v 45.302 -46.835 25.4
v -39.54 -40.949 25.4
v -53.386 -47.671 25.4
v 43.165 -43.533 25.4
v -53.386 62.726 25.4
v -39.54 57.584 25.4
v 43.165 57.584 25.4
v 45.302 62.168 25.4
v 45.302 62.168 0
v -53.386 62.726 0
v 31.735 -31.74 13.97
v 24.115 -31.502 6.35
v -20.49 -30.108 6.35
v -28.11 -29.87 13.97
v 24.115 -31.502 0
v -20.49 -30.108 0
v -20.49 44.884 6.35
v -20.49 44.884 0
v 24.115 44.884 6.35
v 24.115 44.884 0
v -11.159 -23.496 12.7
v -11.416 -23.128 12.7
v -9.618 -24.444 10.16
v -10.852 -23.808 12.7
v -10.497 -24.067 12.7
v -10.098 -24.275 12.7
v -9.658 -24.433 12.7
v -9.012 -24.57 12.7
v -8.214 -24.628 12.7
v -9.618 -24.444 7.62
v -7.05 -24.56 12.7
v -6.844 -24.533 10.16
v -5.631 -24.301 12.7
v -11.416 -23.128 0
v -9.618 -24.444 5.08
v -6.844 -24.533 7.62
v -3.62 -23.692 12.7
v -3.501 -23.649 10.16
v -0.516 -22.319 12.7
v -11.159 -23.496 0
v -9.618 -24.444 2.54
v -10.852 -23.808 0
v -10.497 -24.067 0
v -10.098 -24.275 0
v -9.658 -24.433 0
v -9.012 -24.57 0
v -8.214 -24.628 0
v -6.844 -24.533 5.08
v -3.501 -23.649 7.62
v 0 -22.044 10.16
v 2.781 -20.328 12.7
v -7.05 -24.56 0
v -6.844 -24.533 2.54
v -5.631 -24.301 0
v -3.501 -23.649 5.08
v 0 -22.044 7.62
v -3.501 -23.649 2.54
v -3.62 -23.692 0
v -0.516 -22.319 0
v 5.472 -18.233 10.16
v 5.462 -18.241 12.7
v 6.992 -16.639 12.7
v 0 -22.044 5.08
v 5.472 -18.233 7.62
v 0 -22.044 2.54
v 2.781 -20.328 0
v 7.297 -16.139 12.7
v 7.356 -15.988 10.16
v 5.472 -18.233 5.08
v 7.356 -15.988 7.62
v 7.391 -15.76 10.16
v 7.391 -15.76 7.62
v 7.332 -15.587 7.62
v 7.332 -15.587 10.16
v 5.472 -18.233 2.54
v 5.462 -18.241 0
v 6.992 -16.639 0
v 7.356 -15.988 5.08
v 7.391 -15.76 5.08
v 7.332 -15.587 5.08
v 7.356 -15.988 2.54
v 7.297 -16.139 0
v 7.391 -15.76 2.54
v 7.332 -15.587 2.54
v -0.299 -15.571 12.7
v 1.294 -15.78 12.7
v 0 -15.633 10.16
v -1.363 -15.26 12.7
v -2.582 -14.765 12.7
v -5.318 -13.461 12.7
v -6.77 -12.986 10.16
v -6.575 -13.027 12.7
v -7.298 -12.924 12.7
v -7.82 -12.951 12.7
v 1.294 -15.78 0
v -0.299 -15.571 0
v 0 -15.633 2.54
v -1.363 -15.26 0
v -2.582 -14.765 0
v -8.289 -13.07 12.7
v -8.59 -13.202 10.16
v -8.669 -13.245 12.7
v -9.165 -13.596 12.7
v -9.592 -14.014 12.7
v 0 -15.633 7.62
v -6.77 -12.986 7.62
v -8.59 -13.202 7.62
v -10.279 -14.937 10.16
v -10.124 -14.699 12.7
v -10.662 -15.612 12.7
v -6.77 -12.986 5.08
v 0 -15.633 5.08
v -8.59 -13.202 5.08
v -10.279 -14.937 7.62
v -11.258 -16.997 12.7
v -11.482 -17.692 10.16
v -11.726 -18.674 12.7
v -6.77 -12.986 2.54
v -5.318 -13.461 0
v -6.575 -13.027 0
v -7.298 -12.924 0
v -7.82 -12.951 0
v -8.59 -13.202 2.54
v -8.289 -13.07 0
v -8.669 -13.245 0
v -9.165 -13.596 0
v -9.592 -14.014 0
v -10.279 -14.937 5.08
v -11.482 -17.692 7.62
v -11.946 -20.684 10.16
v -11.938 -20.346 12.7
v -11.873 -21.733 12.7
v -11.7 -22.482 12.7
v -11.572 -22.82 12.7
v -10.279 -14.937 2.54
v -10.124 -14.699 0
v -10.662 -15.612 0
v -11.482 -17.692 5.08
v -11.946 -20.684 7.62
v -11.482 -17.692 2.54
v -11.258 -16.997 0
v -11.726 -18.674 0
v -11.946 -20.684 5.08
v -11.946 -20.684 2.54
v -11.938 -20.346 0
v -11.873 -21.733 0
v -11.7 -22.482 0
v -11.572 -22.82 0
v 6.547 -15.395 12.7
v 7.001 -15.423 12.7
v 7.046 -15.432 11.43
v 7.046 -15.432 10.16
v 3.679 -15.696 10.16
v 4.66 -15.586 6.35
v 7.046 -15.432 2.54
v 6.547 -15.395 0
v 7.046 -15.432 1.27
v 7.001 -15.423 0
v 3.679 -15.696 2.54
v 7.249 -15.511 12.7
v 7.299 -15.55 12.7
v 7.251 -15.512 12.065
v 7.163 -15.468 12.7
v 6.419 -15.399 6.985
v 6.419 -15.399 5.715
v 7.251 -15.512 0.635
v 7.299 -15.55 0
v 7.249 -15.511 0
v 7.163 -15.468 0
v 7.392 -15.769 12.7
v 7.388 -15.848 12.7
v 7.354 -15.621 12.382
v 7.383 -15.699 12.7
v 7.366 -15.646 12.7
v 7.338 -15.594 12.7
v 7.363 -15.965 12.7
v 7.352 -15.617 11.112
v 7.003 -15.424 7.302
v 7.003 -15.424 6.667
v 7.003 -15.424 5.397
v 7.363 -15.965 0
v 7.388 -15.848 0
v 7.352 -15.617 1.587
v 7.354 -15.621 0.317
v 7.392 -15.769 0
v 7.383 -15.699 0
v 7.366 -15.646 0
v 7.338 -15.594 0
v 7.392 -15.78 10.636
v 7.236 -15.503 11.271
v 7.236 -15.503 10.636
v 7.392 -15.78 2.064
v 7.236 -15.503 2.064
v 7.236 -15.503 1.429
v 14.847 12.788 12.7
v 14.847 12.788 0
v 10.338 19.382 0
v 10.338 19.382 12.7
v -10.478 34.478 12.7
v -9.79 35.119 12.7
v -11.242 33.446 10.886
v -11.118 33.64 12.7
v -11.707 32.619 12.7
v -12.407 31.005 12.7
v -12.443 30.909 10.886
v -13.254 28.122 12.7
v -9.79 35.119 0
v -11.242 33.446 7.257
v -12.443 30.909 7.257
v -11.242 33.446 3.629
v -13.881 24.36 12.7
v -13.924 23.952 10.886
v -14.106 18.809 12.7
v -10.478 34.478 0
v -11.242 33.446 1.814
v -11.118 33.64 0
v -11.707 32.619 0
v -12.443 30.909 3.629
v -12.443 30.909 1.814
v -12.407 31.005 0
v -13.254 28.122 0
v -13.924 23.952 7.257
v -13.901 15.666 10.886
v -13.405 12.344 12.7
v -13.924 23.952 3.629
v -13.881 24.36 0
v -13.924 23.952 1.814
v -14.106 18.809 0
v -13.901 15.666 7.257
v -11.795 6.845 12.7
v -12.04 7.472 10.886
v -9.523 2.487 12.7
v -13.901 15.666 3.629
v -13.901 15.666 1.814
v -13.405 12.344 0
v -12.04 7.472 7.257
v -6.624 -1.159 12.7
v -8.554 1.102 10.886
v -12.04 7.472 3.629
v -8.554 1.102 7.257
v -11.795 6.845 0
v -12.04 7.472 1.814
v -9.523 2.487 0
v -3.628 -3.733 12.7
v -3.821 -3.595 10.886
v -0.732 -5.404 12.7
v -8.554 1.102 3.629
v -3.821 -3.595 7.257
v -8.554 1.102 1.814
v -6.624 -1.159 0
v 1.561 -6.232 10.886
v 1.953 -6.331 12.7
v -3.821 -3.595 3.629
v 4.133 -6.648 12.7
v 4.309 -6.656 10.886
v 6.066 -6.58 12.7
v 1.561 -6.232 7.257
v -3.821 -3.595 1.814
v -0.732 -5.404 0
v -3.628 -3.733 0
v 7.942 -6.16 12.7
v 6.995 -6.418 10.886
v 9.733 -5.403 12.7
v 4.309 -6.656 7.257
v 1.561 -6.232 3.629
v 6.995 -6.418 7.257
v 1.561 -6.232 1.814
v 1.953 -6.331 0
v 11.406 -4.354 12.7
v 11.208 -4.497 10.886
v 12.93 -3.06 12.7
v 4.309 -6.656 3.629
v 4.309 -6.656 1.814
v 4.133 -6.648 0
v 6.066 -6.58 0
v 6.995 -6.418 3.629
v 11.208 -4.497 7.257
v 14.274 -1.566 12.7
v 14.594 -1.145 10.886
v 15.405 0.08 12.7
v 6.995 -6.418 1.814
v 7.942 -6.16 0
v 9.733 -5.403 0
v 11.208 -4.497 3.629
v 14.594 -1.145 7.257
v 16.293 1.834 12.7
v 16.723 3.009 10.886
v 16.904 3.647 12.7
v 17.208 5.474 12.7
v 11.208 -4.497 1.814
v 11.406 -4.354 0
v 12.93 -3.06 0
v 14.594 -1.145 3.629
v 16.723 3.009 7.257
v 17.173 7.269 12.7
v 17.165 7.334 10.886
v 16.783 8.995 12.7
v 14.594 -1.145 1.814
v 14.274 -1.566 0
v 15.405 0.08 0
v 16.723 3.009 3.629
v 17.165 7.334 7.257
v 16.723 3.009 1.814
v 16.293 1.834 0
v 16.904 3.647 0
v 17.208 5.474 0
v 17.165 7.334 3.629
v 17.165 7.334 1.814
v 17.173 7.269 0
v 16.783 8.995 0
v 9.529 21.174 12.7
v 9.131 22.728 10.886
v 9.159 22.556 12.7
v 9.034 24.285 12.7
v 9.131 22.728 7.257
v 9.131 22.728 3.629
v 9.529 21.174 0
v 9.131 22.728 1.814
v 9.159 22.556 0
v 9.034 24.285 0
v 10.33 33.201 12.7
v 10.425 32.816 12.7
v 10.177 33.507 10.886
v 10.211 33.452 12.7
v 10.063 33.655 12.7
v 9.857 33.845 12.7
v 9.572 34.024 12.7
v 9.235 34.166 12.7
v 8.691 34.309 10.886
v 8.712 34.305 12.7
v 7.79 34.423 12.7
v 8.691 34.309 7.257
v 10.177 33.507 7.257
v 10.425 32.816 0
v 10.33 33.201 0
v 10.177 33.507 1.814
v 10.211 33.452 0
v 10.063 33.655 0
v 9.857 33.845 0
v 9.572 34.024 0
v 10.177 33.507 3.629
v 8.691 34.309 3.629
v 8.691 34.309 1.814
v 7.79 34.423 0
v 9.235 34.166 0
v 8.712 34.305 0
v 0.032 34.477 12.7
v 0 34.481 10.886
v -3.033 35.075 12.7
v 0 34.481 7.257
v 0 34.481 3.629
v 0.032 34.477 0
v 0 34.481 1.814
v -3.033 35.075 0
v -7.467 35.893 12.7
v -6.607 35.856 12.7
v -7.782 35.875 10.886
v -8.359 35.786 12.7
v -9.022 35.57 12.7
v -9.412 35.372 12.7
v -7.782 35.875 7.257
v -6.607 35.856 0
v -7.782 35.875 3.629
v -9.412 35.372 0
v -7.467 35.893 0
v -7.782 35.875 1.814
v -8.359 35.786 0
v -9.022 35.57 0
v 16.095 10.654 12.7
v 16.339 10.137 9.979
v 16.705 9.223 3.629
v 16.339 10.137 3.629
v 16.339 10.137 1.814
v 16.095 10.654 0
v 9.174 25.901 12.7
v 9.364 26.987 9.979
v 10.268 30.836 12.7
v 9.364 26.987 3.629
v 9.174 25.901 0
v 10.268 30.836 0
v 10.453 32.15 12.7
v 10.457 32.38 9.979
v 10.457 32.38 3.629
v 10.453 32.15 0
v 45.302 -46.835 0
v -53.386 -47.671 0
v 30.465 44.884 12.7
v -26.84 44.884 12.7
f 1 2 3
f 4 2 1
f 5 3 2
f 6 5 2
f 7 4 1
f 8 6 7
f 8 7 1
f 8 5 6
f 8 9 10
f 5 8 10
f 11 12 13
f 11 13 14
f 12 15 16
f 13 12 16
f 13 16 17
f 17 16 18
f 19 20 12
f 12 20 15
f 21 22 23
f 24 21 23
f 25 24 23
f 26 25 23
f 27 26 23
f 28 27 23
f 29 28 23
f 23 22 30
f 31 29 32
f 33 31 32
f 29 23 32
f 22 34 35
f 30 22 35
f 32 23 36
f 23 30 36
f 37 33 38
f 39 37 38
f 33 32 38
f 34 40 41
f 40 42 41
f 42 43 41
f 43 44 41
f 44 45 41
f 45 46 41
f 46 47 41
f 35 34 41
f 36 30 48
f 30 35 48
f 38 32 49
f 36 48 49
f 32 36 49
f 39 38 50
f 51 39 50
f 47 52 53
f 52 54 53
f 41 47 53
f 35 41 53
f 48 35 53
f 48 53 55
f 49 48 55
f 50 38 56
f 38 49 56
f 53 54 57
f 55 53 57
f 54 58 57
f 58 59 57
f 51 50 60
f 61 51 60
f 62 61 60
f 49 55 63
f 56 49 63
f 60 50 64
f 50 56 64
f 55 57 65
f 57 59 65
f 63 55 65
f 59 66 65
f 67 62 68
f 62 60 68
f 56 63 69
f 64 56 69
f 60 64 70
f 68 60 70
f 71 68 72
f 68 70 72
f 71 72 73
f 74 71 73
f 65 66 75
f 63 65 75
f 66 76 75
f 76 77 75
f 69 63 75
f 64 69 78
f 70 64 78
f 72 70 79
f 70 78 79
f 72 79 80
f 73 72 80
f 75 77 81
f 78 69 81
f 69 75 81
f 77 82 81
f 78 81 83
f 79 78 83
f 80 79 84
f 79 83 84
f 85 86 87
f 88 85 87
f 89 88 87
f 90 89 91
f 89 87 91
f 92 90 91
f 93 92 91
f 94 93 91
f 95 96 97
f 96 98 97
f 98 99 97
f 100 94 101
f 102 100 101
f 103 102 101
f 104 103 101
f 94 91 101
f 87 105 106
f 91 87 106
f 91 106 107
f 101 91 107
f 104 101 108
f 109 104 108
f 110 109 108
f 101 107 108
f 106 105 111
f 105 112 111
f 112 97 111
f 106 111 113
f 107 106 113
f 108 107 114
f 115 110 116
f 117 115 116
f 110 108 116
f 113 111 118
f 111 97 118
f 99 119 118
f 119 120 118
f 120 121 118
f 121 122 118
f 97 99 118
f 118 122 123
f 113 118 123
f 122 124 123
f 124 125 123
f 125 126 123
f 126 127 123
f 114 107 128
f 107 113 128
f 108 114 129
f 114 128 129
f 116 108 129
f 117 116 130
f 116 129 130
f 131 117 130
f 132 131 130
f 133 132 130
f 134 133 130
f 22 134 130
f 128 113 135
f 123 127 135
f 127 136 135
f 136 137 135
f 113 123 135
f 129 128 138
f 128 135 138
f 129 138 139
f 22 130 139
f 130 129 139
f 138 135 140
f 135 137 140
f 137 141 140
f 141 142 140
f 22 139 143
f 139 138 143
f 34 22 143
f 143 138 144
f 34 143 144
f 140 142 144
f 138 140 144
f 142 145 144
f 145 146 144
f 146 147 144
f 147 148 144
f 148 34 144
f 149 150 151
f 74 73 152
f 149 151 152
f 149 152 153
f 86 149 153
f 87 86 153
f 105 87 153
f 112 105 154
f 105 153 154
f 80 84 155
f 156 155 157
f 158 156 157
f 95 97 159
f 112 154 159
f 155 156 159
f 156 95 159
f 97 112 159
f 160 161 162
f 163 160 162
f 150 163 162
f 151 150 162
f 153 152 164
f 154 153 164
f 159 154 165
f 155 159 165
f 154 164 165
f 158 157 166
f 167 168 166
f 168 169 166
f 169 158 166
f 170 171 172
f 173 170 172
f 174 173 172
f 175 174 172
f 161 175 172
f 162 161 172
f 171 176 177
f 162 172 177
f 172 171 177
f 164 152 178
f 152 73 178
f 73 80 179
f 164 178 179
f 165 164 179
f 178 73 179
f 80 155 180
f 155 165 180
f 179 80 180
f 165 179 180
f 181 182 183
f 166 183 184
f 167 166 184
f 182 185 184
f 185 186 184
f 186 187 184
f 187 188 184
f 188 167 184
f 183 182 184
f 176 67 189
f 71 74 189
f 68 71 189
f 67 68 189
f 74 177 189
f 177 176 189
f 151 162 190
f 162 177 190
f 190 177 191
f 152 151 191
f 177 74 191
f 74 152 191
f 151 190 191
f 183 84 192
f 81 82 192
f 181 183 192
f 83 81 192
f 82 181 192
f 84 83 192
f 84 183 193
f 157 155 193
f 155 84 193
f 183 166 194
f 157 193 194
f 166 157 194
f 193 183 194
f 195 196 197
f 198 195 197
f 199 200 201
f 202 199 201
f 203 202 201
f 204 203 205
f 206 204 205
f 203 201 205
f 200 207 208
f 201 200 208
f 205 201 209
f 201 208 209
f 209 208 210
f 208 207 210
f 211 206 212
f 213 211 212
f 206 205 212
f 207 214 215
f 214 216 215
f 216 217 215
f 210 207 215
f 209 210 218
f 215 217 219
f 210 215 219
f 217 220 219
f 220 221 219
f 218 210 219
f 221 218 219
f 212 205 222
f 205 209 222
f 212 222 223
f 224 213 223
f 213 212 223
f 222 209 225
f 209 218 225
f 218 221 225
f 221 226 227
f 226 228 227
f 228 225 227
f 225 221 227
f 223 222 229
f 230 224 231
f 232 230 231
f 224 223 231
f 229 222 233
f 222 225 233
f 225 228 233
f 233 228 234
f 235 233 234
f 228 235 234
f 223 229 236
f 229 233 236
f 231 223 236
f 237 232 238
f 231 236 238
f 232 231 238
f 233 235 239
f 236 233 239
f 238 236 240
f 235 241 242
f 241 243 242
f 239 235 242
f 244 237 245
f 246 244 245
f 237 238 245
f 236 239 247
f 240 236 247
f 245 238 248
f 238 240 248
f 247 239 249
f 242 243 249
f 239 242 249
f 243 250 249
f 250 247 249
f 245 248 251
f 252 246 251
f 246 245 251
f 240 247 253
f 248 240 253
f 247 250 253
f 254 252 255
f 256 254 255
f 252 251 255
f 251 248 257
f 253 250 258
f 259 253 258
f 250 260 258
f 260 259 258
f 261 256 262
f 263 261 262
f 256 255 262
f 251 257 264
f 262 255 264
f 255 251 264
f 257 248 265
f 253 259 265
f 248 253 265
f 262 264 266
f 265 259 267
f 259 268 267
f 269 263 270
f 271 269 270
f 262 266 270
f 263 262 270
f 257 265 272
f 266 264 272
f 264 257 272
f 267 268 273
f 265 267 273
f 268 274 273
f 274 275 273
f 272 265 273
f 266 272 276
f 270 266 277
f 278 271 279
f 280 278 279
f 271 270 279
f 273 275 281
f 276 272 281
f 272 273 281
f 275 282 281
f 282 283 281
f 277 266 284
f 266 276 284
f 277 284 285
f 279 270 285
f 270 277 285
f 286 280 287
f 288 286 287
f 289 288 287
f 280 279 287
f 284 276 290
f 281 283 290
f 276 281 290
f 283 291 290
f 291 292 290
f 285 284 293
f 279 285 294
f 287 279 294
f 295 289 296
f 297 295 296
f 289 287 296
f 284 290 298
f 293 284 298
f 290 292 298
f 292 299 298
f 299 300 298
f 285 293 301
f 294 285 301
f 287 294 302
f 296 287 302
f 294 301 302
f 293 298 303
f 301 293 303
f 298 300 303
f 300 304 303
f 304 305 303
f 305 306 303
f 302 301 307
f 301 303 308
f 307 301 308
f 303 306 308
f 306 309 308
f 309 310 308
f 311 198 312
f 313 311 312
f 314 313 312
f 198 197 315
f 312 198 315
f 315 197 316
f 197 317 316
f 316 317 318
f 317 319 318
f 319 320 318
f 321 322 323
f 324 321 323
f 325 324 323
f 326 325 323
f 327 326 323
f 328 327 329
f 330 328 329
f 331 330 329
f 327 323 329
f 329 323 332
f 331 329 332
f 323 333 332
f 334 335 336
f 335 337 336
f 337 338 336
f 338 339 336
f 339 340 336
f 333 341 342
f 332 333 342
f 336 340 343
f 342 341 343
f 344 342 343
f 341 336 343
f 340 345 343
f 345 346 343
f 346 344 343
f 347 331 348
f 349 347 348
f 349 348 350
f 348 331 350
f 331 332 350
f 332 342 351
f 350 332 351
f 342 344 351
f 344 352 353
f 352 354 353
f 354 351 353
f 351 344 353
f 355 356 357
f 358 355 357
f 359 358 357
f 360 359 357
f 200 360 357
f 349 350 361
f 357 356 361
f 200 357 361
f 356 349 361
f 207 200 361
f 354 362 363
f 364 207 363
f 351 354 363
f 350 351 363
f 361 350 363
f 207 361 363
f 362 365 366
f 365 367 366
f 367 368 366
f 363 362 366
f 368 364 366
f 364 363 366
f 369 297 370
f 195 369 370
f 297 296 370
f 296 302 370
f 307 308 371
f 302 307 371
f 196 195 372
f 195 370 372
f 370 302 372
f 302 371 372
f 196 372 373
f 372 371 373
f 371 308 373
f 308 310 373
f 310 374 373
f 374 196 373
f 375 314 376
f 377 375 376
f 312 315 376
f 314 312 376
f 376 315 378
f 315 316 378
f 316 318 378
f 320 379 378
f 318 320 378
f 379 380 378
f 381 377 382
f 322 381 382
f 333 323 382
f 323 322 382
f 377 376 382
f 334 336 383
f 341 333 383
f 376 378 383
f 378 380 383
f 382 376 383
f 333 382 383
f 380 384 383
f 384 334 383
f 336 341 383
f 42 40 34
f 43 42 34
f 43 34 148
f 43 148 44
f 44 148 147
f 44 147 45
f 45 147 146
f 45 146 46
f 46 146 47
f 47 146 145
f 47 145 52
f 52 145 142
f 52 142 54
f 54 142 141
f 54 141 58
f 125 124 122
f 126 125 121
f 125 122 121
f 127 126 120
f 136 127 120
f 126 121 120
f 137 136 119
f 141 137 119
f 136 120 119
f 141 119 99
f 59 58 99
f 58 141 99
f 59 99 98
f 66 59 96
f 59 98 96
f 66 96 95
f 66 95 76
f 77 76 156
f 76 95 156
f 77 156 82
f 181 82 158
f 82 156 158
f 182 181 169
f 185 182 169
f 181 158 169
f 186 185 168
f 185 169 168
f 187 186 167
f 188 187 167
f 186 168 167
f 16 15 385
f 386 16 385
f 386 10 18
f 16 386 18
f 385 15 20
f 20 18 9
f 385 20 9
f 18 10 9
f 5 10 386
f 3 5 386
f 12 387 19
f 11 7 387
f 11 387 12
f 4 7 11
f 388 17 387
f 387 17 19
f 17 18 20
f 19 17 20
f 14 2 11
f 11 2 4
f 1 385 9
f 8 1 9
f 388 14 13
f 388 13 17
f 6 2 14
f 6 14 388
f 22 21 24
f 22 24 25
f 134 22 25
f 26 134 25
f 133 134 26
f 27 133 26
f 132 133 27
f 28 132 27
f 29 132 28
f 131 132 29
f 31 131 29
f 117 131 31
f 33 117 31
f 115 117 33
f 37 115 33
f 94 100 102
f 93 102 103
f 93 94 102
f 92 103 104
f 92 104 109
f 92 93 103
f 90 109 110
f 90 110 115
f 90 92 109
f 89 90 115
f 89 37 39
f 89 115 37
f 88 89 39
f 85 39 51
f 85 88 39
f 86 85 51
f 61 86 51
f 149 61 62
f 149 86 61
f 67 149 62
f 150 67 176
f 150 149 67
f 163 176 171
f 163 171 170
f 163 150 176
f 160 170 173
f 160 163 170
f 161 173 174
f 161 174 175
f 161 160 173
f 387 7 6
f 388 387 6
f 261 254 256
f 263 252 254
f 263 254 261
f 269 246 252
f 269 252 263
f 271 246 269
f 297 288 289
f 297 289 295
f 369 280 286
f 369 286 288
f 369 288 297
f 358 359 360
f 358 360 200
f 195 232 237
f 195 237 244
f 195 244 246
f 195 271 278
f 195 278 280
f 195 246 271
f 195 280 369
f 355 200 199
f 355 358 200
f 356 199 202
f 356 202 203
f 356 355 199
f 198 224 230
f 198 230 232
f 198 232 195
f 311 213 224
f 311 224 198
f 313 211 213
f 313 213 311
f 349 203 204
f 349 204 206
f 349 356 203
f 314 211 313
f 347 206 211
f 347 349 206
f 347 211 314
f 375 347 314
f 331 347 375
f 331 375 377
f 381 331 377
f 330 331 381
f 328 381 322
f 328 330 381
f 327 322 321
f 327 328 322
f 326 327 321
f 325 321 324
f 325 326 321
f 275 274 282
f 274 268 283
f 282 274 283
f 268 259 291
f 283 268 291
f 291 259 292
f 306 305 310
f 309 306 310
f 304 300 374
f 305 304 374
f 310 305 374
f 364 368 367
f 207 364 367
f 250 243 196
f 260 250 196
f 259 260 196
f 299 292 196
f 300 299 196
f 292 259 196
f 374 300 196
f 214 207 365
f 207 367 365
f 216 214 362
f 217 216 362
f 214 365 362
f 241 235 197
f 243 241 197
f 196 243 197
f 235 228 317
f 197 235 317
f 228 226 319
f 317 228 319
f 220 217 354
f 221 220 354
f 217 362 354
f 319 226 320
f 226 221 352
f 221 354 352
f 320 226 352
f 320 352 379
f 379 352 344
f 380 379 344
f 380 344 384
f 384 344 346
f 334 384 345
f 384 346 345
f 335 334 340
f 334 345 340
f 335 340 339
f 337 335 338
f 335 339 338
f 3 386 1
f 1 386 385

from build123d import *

# Parameters (mm, degrees)
F1_DEPTH = 25.4
F2_SIZE  = 19.05
F3_SIZE  = 12.7
F4_SIZE  = 11.43
F6_DEPTH = 12.7


with BuildPart() as f1:
    # F0 (on Top) → F1 (new body)
    with BuildSketch(Plane.XY):
        Polygon((-20.4903651029, 44.8836609721), (-53.3864609897, 62.7256110311), (-53.3864609897, -47.6714633405), (-20.4903651029, -30.1082935184), align=None)
        Polygon((45.3018322587, 62.1680468321), (-53.3864609897, 62.7256110311), (-20.4903651029, 44.8836609721), (24.1145156324, 44.8836609721), align=None)
        Polygon((45.3018322587, -46.8351207674), (45.3018322587, 62.1680468321), (24.1145156324, 44.8836609721), (24.1145156324, -31.5021947026), align=None)
        Polygon((-20.4903651029, -30.1082935184), (-53.3864609897, -47.6714633405), (45.3018322587, -46.8351207674), (24.1145156324, -31.5021947026), align=None)
    extrude(amount=F1_DEPTH)

    # F2
    f2_edges = [f1.edges().sort_by_distance(p)[0] for p in [
        (-20.490365, 7.387684, 25.4),
        (24.114516, 6.690733, 25.4),
    ]]
    chamfer(f2_edges, length=F2_SIZE)

    # F3
    f3_edges = [f1.edges().sort_by_distance(p)[0] for p in [
        (1.812075, 44.883661, 25.4),
    ]]
    chamfer(f3_edges, length=F3_SIZE)

    # F4
    f4_edges = [f1.edges().sort_by_distance(p)[0] for p in [
        (1.812075, -30.805244, 25.4),
    ]]
    chamfer(f4_edges, length=F4_SIZE)


with BuildPart() as f6:
    # F5 (on Top) → F6 (new body)
    with BuildSketch(Plane.XY):
        with BuildLine():
            add(Edge.make_bspline(
                [(-9.7902296111, 35.119459033), (-13.9600314327, 31.9671192837), (-17.6768482544, 4.563162706), (7.1950515709, -13.099769391), (22.8519345715, 8.6072810613), (4.8512330884, 20.8593058063), (14.1187603019, 36.4323892034), (-0.7011915668, 32.8433910096), (-7.310382144, 36.9942056223), (-9.7902296111, 35.119459033)],
                knots=[0, 0, 0, 0, 0.1878028732, 0.3608969238, 0.5083654729, 0.6569516297, 0.774297262, 0.8883106441, 1, 1, 1, 1], degree=3))
        make_face()
    extrude(amount=F6_DEPTH)


with BuildPart() as f6b:
    # F5 (on Top) → F6, piece 2 (new body)
    with BuildSketch(Plane.XY):
        with BuildLine():
            add(Edge.make_bspline(
                [(-11.4156901836, -23.1283828616), (-9.8528718543, -25.8123261533), (0.2637004008, -23.3887641196), (11.0865715709, -13.4223369011), (-0.9156724072, -17.6664935078), (-9.3362887382, -8.8161935634), (-12.8983318733, -20.5821328321), (-11.4156901836, -23.1283828616)],
                knots=[0, 0, 0, 0, 0.2195998788, 0.4222999547, 0.5979031768, 0.7916661654, 1, 1, 1, 1], degree=3))
        make_face()
    extrude(amount=F6_DEPTH)


solid = Compound([f1.part, f6.part, f6b.part])
